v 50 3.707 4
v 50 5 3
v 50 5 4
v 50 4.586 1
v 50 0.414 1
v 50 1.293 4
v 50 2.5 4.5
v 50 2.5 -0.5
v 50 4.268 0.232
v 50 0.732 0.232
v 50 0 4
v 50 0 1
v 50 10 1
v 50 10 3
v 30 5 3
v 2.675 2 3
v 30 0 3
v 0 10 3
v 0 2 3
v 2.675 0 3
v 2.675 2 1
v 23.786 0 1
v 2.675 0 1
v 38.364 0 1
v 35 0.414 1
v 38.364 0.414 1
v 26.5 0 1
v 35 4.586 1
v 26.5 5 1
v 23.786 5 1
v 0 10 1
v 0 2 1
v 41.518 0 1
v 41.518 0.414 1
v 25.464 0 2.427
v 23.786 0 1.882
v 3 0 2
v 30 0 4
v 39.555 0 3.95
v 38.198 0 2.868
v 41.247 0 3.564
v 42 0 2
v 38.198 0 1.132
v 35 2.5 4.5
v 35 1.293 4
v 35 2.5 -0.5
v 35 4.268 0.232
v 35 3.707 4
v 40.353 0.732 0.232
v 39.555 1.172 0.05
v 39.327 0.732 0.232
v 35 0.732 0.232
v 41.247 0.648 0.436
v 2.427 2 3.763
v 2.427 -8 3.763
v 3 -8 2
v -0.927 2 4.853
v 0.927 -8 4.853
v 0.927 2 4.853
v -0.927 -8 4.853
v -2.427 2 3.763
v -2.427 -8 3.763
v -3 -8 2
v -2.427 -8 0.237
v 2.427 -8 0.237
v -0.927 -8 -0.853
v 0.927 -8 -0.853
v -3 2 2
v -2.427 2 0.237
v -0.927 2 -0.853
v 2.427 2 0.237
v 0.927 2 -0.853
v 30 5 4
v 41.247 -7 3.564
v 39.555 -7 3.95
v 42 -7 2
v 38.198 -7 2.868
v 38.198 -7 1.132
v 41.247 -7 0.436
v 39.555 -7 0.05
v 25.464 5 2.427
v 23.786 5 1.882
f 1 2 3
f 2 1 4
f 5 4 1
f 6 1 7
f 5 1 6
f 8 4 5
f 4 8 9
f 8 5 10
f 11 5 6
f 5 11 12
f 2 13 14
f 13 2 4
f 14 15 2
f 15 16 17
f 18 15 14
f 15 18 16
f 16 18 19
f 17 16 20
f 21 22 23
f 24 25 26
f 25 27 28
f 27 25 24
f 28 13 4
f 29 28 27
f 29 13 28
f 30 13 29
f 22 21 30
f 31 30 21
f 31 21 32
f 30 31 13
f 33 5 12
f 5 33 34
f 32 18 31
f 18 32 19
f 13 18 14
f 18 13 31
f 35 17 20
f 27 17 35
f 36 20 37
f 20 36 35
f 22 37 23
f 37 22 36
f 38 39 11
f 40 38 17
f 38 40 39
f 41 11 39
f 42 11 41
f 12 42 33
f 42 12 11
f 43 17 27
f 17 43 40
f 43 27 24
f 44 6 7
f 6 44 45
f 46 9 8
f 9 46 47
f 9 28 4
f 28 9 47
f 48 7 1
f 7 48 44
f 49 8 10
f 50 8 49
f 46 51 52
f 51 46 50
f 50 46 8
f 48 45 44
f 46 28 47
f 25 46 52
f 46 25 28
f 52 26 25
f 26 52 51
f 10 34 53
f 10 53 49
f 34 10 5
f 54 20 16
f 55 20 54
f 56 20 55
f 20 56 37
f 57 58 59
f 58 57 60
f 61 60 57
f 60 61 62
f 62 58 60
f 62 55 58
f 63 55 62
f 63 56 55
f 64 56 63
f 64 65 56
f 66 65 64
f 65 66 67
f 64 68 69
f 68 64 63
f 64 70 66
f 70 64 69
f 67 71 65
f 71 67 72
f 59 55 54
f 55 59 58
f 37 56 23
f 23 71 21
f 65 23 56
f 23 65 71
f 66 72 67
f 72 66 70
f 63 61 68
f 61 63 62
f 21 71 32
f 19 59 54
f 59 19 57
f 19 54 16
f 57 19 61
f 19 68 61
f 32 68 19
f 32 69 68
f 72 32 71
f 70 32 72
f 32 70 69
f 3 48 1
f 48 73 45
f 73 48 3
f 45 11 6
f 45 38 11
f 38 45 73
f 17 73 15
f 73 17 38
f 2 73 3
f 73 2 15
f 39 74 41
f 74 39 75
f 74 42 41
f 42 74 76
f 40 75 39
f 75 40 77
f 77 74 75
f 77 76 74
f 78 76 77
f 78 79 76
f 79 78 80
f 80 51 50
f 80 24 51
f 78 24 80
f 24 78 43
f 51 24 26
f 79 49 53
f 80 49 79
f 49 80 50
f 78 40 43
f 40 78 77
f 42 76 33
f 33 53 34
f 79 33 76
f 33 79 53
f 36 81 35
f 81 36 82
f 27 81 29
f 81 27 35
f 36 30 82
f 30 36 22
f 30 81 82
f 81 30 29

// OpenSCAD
// Parameters
clip_length = 50;
clip_width = 10;
clip_thickness = 2;
hook_length = 15;
hook_height = 5;
hinge_radius = 3;
arm_length = 20;
arm_width = 5;
spigot_diameter = 4;
spigot_length = 10;
mounting_hole_diameter = 3;
mounting_hole_depth = 5;

// Clip Body
module clip_body() {
    translate([0, 0, clip_thickness/2])
    cube([clip_length, clip_width, clip_thickness]);
}

// Hook Section
module hook_section() {
    translate([clip_length - hook_length, clip_width/2 - hook_height/2, clip_thickness])
    rotate([0, 90, 0])
    cylinder(h = hook_length, r = hook_height/2);
}

// Hinge Bend
module hinge_bend() {
    translate([0, clip_width/2 - hinge_radius, clip_thickness])
    rotate([90, 0, 0])
    cylinder(h = clip_width, r = hinge_radius);
}

// Arms
module arms() {
    translate([0, 0, clip_thickness])
    cube([arm_length, arm_width, clip_thickness]);
}

// Spigot
module spigot() {
    translate([clip_length - spigot_length, clip_width/2 - spigot_diameter/2, clip_thickness])
    rotate([90, 0, 0])
    cylinder(h = spigot_length, r = spigot_diameter/2);
}

// Mounting Hole Feature
module mounting_hole_feature() {
    translate([clip_length/2, clip_width/2, clip_thickness/2])
    rotate([90, 0, 0])
    cylinder(h = mounting_hole_depth, r = mounting_hole_diameter/2);
}

// Swiss Clip
module swiss_clip() {
    clip_body();
    hook_section();
    hinge_bend();
    translate([clip_length - arm_length, 0, 0]) arms();
    spigot();
}

// Swiss Clip with Hole
module swiss_clip_hole() {
    difference() {
        swiss_clip();
        mounting_hole_feature();
    }
}

// Render the Swiss Clip with Hole
swiss_clip_hole();
